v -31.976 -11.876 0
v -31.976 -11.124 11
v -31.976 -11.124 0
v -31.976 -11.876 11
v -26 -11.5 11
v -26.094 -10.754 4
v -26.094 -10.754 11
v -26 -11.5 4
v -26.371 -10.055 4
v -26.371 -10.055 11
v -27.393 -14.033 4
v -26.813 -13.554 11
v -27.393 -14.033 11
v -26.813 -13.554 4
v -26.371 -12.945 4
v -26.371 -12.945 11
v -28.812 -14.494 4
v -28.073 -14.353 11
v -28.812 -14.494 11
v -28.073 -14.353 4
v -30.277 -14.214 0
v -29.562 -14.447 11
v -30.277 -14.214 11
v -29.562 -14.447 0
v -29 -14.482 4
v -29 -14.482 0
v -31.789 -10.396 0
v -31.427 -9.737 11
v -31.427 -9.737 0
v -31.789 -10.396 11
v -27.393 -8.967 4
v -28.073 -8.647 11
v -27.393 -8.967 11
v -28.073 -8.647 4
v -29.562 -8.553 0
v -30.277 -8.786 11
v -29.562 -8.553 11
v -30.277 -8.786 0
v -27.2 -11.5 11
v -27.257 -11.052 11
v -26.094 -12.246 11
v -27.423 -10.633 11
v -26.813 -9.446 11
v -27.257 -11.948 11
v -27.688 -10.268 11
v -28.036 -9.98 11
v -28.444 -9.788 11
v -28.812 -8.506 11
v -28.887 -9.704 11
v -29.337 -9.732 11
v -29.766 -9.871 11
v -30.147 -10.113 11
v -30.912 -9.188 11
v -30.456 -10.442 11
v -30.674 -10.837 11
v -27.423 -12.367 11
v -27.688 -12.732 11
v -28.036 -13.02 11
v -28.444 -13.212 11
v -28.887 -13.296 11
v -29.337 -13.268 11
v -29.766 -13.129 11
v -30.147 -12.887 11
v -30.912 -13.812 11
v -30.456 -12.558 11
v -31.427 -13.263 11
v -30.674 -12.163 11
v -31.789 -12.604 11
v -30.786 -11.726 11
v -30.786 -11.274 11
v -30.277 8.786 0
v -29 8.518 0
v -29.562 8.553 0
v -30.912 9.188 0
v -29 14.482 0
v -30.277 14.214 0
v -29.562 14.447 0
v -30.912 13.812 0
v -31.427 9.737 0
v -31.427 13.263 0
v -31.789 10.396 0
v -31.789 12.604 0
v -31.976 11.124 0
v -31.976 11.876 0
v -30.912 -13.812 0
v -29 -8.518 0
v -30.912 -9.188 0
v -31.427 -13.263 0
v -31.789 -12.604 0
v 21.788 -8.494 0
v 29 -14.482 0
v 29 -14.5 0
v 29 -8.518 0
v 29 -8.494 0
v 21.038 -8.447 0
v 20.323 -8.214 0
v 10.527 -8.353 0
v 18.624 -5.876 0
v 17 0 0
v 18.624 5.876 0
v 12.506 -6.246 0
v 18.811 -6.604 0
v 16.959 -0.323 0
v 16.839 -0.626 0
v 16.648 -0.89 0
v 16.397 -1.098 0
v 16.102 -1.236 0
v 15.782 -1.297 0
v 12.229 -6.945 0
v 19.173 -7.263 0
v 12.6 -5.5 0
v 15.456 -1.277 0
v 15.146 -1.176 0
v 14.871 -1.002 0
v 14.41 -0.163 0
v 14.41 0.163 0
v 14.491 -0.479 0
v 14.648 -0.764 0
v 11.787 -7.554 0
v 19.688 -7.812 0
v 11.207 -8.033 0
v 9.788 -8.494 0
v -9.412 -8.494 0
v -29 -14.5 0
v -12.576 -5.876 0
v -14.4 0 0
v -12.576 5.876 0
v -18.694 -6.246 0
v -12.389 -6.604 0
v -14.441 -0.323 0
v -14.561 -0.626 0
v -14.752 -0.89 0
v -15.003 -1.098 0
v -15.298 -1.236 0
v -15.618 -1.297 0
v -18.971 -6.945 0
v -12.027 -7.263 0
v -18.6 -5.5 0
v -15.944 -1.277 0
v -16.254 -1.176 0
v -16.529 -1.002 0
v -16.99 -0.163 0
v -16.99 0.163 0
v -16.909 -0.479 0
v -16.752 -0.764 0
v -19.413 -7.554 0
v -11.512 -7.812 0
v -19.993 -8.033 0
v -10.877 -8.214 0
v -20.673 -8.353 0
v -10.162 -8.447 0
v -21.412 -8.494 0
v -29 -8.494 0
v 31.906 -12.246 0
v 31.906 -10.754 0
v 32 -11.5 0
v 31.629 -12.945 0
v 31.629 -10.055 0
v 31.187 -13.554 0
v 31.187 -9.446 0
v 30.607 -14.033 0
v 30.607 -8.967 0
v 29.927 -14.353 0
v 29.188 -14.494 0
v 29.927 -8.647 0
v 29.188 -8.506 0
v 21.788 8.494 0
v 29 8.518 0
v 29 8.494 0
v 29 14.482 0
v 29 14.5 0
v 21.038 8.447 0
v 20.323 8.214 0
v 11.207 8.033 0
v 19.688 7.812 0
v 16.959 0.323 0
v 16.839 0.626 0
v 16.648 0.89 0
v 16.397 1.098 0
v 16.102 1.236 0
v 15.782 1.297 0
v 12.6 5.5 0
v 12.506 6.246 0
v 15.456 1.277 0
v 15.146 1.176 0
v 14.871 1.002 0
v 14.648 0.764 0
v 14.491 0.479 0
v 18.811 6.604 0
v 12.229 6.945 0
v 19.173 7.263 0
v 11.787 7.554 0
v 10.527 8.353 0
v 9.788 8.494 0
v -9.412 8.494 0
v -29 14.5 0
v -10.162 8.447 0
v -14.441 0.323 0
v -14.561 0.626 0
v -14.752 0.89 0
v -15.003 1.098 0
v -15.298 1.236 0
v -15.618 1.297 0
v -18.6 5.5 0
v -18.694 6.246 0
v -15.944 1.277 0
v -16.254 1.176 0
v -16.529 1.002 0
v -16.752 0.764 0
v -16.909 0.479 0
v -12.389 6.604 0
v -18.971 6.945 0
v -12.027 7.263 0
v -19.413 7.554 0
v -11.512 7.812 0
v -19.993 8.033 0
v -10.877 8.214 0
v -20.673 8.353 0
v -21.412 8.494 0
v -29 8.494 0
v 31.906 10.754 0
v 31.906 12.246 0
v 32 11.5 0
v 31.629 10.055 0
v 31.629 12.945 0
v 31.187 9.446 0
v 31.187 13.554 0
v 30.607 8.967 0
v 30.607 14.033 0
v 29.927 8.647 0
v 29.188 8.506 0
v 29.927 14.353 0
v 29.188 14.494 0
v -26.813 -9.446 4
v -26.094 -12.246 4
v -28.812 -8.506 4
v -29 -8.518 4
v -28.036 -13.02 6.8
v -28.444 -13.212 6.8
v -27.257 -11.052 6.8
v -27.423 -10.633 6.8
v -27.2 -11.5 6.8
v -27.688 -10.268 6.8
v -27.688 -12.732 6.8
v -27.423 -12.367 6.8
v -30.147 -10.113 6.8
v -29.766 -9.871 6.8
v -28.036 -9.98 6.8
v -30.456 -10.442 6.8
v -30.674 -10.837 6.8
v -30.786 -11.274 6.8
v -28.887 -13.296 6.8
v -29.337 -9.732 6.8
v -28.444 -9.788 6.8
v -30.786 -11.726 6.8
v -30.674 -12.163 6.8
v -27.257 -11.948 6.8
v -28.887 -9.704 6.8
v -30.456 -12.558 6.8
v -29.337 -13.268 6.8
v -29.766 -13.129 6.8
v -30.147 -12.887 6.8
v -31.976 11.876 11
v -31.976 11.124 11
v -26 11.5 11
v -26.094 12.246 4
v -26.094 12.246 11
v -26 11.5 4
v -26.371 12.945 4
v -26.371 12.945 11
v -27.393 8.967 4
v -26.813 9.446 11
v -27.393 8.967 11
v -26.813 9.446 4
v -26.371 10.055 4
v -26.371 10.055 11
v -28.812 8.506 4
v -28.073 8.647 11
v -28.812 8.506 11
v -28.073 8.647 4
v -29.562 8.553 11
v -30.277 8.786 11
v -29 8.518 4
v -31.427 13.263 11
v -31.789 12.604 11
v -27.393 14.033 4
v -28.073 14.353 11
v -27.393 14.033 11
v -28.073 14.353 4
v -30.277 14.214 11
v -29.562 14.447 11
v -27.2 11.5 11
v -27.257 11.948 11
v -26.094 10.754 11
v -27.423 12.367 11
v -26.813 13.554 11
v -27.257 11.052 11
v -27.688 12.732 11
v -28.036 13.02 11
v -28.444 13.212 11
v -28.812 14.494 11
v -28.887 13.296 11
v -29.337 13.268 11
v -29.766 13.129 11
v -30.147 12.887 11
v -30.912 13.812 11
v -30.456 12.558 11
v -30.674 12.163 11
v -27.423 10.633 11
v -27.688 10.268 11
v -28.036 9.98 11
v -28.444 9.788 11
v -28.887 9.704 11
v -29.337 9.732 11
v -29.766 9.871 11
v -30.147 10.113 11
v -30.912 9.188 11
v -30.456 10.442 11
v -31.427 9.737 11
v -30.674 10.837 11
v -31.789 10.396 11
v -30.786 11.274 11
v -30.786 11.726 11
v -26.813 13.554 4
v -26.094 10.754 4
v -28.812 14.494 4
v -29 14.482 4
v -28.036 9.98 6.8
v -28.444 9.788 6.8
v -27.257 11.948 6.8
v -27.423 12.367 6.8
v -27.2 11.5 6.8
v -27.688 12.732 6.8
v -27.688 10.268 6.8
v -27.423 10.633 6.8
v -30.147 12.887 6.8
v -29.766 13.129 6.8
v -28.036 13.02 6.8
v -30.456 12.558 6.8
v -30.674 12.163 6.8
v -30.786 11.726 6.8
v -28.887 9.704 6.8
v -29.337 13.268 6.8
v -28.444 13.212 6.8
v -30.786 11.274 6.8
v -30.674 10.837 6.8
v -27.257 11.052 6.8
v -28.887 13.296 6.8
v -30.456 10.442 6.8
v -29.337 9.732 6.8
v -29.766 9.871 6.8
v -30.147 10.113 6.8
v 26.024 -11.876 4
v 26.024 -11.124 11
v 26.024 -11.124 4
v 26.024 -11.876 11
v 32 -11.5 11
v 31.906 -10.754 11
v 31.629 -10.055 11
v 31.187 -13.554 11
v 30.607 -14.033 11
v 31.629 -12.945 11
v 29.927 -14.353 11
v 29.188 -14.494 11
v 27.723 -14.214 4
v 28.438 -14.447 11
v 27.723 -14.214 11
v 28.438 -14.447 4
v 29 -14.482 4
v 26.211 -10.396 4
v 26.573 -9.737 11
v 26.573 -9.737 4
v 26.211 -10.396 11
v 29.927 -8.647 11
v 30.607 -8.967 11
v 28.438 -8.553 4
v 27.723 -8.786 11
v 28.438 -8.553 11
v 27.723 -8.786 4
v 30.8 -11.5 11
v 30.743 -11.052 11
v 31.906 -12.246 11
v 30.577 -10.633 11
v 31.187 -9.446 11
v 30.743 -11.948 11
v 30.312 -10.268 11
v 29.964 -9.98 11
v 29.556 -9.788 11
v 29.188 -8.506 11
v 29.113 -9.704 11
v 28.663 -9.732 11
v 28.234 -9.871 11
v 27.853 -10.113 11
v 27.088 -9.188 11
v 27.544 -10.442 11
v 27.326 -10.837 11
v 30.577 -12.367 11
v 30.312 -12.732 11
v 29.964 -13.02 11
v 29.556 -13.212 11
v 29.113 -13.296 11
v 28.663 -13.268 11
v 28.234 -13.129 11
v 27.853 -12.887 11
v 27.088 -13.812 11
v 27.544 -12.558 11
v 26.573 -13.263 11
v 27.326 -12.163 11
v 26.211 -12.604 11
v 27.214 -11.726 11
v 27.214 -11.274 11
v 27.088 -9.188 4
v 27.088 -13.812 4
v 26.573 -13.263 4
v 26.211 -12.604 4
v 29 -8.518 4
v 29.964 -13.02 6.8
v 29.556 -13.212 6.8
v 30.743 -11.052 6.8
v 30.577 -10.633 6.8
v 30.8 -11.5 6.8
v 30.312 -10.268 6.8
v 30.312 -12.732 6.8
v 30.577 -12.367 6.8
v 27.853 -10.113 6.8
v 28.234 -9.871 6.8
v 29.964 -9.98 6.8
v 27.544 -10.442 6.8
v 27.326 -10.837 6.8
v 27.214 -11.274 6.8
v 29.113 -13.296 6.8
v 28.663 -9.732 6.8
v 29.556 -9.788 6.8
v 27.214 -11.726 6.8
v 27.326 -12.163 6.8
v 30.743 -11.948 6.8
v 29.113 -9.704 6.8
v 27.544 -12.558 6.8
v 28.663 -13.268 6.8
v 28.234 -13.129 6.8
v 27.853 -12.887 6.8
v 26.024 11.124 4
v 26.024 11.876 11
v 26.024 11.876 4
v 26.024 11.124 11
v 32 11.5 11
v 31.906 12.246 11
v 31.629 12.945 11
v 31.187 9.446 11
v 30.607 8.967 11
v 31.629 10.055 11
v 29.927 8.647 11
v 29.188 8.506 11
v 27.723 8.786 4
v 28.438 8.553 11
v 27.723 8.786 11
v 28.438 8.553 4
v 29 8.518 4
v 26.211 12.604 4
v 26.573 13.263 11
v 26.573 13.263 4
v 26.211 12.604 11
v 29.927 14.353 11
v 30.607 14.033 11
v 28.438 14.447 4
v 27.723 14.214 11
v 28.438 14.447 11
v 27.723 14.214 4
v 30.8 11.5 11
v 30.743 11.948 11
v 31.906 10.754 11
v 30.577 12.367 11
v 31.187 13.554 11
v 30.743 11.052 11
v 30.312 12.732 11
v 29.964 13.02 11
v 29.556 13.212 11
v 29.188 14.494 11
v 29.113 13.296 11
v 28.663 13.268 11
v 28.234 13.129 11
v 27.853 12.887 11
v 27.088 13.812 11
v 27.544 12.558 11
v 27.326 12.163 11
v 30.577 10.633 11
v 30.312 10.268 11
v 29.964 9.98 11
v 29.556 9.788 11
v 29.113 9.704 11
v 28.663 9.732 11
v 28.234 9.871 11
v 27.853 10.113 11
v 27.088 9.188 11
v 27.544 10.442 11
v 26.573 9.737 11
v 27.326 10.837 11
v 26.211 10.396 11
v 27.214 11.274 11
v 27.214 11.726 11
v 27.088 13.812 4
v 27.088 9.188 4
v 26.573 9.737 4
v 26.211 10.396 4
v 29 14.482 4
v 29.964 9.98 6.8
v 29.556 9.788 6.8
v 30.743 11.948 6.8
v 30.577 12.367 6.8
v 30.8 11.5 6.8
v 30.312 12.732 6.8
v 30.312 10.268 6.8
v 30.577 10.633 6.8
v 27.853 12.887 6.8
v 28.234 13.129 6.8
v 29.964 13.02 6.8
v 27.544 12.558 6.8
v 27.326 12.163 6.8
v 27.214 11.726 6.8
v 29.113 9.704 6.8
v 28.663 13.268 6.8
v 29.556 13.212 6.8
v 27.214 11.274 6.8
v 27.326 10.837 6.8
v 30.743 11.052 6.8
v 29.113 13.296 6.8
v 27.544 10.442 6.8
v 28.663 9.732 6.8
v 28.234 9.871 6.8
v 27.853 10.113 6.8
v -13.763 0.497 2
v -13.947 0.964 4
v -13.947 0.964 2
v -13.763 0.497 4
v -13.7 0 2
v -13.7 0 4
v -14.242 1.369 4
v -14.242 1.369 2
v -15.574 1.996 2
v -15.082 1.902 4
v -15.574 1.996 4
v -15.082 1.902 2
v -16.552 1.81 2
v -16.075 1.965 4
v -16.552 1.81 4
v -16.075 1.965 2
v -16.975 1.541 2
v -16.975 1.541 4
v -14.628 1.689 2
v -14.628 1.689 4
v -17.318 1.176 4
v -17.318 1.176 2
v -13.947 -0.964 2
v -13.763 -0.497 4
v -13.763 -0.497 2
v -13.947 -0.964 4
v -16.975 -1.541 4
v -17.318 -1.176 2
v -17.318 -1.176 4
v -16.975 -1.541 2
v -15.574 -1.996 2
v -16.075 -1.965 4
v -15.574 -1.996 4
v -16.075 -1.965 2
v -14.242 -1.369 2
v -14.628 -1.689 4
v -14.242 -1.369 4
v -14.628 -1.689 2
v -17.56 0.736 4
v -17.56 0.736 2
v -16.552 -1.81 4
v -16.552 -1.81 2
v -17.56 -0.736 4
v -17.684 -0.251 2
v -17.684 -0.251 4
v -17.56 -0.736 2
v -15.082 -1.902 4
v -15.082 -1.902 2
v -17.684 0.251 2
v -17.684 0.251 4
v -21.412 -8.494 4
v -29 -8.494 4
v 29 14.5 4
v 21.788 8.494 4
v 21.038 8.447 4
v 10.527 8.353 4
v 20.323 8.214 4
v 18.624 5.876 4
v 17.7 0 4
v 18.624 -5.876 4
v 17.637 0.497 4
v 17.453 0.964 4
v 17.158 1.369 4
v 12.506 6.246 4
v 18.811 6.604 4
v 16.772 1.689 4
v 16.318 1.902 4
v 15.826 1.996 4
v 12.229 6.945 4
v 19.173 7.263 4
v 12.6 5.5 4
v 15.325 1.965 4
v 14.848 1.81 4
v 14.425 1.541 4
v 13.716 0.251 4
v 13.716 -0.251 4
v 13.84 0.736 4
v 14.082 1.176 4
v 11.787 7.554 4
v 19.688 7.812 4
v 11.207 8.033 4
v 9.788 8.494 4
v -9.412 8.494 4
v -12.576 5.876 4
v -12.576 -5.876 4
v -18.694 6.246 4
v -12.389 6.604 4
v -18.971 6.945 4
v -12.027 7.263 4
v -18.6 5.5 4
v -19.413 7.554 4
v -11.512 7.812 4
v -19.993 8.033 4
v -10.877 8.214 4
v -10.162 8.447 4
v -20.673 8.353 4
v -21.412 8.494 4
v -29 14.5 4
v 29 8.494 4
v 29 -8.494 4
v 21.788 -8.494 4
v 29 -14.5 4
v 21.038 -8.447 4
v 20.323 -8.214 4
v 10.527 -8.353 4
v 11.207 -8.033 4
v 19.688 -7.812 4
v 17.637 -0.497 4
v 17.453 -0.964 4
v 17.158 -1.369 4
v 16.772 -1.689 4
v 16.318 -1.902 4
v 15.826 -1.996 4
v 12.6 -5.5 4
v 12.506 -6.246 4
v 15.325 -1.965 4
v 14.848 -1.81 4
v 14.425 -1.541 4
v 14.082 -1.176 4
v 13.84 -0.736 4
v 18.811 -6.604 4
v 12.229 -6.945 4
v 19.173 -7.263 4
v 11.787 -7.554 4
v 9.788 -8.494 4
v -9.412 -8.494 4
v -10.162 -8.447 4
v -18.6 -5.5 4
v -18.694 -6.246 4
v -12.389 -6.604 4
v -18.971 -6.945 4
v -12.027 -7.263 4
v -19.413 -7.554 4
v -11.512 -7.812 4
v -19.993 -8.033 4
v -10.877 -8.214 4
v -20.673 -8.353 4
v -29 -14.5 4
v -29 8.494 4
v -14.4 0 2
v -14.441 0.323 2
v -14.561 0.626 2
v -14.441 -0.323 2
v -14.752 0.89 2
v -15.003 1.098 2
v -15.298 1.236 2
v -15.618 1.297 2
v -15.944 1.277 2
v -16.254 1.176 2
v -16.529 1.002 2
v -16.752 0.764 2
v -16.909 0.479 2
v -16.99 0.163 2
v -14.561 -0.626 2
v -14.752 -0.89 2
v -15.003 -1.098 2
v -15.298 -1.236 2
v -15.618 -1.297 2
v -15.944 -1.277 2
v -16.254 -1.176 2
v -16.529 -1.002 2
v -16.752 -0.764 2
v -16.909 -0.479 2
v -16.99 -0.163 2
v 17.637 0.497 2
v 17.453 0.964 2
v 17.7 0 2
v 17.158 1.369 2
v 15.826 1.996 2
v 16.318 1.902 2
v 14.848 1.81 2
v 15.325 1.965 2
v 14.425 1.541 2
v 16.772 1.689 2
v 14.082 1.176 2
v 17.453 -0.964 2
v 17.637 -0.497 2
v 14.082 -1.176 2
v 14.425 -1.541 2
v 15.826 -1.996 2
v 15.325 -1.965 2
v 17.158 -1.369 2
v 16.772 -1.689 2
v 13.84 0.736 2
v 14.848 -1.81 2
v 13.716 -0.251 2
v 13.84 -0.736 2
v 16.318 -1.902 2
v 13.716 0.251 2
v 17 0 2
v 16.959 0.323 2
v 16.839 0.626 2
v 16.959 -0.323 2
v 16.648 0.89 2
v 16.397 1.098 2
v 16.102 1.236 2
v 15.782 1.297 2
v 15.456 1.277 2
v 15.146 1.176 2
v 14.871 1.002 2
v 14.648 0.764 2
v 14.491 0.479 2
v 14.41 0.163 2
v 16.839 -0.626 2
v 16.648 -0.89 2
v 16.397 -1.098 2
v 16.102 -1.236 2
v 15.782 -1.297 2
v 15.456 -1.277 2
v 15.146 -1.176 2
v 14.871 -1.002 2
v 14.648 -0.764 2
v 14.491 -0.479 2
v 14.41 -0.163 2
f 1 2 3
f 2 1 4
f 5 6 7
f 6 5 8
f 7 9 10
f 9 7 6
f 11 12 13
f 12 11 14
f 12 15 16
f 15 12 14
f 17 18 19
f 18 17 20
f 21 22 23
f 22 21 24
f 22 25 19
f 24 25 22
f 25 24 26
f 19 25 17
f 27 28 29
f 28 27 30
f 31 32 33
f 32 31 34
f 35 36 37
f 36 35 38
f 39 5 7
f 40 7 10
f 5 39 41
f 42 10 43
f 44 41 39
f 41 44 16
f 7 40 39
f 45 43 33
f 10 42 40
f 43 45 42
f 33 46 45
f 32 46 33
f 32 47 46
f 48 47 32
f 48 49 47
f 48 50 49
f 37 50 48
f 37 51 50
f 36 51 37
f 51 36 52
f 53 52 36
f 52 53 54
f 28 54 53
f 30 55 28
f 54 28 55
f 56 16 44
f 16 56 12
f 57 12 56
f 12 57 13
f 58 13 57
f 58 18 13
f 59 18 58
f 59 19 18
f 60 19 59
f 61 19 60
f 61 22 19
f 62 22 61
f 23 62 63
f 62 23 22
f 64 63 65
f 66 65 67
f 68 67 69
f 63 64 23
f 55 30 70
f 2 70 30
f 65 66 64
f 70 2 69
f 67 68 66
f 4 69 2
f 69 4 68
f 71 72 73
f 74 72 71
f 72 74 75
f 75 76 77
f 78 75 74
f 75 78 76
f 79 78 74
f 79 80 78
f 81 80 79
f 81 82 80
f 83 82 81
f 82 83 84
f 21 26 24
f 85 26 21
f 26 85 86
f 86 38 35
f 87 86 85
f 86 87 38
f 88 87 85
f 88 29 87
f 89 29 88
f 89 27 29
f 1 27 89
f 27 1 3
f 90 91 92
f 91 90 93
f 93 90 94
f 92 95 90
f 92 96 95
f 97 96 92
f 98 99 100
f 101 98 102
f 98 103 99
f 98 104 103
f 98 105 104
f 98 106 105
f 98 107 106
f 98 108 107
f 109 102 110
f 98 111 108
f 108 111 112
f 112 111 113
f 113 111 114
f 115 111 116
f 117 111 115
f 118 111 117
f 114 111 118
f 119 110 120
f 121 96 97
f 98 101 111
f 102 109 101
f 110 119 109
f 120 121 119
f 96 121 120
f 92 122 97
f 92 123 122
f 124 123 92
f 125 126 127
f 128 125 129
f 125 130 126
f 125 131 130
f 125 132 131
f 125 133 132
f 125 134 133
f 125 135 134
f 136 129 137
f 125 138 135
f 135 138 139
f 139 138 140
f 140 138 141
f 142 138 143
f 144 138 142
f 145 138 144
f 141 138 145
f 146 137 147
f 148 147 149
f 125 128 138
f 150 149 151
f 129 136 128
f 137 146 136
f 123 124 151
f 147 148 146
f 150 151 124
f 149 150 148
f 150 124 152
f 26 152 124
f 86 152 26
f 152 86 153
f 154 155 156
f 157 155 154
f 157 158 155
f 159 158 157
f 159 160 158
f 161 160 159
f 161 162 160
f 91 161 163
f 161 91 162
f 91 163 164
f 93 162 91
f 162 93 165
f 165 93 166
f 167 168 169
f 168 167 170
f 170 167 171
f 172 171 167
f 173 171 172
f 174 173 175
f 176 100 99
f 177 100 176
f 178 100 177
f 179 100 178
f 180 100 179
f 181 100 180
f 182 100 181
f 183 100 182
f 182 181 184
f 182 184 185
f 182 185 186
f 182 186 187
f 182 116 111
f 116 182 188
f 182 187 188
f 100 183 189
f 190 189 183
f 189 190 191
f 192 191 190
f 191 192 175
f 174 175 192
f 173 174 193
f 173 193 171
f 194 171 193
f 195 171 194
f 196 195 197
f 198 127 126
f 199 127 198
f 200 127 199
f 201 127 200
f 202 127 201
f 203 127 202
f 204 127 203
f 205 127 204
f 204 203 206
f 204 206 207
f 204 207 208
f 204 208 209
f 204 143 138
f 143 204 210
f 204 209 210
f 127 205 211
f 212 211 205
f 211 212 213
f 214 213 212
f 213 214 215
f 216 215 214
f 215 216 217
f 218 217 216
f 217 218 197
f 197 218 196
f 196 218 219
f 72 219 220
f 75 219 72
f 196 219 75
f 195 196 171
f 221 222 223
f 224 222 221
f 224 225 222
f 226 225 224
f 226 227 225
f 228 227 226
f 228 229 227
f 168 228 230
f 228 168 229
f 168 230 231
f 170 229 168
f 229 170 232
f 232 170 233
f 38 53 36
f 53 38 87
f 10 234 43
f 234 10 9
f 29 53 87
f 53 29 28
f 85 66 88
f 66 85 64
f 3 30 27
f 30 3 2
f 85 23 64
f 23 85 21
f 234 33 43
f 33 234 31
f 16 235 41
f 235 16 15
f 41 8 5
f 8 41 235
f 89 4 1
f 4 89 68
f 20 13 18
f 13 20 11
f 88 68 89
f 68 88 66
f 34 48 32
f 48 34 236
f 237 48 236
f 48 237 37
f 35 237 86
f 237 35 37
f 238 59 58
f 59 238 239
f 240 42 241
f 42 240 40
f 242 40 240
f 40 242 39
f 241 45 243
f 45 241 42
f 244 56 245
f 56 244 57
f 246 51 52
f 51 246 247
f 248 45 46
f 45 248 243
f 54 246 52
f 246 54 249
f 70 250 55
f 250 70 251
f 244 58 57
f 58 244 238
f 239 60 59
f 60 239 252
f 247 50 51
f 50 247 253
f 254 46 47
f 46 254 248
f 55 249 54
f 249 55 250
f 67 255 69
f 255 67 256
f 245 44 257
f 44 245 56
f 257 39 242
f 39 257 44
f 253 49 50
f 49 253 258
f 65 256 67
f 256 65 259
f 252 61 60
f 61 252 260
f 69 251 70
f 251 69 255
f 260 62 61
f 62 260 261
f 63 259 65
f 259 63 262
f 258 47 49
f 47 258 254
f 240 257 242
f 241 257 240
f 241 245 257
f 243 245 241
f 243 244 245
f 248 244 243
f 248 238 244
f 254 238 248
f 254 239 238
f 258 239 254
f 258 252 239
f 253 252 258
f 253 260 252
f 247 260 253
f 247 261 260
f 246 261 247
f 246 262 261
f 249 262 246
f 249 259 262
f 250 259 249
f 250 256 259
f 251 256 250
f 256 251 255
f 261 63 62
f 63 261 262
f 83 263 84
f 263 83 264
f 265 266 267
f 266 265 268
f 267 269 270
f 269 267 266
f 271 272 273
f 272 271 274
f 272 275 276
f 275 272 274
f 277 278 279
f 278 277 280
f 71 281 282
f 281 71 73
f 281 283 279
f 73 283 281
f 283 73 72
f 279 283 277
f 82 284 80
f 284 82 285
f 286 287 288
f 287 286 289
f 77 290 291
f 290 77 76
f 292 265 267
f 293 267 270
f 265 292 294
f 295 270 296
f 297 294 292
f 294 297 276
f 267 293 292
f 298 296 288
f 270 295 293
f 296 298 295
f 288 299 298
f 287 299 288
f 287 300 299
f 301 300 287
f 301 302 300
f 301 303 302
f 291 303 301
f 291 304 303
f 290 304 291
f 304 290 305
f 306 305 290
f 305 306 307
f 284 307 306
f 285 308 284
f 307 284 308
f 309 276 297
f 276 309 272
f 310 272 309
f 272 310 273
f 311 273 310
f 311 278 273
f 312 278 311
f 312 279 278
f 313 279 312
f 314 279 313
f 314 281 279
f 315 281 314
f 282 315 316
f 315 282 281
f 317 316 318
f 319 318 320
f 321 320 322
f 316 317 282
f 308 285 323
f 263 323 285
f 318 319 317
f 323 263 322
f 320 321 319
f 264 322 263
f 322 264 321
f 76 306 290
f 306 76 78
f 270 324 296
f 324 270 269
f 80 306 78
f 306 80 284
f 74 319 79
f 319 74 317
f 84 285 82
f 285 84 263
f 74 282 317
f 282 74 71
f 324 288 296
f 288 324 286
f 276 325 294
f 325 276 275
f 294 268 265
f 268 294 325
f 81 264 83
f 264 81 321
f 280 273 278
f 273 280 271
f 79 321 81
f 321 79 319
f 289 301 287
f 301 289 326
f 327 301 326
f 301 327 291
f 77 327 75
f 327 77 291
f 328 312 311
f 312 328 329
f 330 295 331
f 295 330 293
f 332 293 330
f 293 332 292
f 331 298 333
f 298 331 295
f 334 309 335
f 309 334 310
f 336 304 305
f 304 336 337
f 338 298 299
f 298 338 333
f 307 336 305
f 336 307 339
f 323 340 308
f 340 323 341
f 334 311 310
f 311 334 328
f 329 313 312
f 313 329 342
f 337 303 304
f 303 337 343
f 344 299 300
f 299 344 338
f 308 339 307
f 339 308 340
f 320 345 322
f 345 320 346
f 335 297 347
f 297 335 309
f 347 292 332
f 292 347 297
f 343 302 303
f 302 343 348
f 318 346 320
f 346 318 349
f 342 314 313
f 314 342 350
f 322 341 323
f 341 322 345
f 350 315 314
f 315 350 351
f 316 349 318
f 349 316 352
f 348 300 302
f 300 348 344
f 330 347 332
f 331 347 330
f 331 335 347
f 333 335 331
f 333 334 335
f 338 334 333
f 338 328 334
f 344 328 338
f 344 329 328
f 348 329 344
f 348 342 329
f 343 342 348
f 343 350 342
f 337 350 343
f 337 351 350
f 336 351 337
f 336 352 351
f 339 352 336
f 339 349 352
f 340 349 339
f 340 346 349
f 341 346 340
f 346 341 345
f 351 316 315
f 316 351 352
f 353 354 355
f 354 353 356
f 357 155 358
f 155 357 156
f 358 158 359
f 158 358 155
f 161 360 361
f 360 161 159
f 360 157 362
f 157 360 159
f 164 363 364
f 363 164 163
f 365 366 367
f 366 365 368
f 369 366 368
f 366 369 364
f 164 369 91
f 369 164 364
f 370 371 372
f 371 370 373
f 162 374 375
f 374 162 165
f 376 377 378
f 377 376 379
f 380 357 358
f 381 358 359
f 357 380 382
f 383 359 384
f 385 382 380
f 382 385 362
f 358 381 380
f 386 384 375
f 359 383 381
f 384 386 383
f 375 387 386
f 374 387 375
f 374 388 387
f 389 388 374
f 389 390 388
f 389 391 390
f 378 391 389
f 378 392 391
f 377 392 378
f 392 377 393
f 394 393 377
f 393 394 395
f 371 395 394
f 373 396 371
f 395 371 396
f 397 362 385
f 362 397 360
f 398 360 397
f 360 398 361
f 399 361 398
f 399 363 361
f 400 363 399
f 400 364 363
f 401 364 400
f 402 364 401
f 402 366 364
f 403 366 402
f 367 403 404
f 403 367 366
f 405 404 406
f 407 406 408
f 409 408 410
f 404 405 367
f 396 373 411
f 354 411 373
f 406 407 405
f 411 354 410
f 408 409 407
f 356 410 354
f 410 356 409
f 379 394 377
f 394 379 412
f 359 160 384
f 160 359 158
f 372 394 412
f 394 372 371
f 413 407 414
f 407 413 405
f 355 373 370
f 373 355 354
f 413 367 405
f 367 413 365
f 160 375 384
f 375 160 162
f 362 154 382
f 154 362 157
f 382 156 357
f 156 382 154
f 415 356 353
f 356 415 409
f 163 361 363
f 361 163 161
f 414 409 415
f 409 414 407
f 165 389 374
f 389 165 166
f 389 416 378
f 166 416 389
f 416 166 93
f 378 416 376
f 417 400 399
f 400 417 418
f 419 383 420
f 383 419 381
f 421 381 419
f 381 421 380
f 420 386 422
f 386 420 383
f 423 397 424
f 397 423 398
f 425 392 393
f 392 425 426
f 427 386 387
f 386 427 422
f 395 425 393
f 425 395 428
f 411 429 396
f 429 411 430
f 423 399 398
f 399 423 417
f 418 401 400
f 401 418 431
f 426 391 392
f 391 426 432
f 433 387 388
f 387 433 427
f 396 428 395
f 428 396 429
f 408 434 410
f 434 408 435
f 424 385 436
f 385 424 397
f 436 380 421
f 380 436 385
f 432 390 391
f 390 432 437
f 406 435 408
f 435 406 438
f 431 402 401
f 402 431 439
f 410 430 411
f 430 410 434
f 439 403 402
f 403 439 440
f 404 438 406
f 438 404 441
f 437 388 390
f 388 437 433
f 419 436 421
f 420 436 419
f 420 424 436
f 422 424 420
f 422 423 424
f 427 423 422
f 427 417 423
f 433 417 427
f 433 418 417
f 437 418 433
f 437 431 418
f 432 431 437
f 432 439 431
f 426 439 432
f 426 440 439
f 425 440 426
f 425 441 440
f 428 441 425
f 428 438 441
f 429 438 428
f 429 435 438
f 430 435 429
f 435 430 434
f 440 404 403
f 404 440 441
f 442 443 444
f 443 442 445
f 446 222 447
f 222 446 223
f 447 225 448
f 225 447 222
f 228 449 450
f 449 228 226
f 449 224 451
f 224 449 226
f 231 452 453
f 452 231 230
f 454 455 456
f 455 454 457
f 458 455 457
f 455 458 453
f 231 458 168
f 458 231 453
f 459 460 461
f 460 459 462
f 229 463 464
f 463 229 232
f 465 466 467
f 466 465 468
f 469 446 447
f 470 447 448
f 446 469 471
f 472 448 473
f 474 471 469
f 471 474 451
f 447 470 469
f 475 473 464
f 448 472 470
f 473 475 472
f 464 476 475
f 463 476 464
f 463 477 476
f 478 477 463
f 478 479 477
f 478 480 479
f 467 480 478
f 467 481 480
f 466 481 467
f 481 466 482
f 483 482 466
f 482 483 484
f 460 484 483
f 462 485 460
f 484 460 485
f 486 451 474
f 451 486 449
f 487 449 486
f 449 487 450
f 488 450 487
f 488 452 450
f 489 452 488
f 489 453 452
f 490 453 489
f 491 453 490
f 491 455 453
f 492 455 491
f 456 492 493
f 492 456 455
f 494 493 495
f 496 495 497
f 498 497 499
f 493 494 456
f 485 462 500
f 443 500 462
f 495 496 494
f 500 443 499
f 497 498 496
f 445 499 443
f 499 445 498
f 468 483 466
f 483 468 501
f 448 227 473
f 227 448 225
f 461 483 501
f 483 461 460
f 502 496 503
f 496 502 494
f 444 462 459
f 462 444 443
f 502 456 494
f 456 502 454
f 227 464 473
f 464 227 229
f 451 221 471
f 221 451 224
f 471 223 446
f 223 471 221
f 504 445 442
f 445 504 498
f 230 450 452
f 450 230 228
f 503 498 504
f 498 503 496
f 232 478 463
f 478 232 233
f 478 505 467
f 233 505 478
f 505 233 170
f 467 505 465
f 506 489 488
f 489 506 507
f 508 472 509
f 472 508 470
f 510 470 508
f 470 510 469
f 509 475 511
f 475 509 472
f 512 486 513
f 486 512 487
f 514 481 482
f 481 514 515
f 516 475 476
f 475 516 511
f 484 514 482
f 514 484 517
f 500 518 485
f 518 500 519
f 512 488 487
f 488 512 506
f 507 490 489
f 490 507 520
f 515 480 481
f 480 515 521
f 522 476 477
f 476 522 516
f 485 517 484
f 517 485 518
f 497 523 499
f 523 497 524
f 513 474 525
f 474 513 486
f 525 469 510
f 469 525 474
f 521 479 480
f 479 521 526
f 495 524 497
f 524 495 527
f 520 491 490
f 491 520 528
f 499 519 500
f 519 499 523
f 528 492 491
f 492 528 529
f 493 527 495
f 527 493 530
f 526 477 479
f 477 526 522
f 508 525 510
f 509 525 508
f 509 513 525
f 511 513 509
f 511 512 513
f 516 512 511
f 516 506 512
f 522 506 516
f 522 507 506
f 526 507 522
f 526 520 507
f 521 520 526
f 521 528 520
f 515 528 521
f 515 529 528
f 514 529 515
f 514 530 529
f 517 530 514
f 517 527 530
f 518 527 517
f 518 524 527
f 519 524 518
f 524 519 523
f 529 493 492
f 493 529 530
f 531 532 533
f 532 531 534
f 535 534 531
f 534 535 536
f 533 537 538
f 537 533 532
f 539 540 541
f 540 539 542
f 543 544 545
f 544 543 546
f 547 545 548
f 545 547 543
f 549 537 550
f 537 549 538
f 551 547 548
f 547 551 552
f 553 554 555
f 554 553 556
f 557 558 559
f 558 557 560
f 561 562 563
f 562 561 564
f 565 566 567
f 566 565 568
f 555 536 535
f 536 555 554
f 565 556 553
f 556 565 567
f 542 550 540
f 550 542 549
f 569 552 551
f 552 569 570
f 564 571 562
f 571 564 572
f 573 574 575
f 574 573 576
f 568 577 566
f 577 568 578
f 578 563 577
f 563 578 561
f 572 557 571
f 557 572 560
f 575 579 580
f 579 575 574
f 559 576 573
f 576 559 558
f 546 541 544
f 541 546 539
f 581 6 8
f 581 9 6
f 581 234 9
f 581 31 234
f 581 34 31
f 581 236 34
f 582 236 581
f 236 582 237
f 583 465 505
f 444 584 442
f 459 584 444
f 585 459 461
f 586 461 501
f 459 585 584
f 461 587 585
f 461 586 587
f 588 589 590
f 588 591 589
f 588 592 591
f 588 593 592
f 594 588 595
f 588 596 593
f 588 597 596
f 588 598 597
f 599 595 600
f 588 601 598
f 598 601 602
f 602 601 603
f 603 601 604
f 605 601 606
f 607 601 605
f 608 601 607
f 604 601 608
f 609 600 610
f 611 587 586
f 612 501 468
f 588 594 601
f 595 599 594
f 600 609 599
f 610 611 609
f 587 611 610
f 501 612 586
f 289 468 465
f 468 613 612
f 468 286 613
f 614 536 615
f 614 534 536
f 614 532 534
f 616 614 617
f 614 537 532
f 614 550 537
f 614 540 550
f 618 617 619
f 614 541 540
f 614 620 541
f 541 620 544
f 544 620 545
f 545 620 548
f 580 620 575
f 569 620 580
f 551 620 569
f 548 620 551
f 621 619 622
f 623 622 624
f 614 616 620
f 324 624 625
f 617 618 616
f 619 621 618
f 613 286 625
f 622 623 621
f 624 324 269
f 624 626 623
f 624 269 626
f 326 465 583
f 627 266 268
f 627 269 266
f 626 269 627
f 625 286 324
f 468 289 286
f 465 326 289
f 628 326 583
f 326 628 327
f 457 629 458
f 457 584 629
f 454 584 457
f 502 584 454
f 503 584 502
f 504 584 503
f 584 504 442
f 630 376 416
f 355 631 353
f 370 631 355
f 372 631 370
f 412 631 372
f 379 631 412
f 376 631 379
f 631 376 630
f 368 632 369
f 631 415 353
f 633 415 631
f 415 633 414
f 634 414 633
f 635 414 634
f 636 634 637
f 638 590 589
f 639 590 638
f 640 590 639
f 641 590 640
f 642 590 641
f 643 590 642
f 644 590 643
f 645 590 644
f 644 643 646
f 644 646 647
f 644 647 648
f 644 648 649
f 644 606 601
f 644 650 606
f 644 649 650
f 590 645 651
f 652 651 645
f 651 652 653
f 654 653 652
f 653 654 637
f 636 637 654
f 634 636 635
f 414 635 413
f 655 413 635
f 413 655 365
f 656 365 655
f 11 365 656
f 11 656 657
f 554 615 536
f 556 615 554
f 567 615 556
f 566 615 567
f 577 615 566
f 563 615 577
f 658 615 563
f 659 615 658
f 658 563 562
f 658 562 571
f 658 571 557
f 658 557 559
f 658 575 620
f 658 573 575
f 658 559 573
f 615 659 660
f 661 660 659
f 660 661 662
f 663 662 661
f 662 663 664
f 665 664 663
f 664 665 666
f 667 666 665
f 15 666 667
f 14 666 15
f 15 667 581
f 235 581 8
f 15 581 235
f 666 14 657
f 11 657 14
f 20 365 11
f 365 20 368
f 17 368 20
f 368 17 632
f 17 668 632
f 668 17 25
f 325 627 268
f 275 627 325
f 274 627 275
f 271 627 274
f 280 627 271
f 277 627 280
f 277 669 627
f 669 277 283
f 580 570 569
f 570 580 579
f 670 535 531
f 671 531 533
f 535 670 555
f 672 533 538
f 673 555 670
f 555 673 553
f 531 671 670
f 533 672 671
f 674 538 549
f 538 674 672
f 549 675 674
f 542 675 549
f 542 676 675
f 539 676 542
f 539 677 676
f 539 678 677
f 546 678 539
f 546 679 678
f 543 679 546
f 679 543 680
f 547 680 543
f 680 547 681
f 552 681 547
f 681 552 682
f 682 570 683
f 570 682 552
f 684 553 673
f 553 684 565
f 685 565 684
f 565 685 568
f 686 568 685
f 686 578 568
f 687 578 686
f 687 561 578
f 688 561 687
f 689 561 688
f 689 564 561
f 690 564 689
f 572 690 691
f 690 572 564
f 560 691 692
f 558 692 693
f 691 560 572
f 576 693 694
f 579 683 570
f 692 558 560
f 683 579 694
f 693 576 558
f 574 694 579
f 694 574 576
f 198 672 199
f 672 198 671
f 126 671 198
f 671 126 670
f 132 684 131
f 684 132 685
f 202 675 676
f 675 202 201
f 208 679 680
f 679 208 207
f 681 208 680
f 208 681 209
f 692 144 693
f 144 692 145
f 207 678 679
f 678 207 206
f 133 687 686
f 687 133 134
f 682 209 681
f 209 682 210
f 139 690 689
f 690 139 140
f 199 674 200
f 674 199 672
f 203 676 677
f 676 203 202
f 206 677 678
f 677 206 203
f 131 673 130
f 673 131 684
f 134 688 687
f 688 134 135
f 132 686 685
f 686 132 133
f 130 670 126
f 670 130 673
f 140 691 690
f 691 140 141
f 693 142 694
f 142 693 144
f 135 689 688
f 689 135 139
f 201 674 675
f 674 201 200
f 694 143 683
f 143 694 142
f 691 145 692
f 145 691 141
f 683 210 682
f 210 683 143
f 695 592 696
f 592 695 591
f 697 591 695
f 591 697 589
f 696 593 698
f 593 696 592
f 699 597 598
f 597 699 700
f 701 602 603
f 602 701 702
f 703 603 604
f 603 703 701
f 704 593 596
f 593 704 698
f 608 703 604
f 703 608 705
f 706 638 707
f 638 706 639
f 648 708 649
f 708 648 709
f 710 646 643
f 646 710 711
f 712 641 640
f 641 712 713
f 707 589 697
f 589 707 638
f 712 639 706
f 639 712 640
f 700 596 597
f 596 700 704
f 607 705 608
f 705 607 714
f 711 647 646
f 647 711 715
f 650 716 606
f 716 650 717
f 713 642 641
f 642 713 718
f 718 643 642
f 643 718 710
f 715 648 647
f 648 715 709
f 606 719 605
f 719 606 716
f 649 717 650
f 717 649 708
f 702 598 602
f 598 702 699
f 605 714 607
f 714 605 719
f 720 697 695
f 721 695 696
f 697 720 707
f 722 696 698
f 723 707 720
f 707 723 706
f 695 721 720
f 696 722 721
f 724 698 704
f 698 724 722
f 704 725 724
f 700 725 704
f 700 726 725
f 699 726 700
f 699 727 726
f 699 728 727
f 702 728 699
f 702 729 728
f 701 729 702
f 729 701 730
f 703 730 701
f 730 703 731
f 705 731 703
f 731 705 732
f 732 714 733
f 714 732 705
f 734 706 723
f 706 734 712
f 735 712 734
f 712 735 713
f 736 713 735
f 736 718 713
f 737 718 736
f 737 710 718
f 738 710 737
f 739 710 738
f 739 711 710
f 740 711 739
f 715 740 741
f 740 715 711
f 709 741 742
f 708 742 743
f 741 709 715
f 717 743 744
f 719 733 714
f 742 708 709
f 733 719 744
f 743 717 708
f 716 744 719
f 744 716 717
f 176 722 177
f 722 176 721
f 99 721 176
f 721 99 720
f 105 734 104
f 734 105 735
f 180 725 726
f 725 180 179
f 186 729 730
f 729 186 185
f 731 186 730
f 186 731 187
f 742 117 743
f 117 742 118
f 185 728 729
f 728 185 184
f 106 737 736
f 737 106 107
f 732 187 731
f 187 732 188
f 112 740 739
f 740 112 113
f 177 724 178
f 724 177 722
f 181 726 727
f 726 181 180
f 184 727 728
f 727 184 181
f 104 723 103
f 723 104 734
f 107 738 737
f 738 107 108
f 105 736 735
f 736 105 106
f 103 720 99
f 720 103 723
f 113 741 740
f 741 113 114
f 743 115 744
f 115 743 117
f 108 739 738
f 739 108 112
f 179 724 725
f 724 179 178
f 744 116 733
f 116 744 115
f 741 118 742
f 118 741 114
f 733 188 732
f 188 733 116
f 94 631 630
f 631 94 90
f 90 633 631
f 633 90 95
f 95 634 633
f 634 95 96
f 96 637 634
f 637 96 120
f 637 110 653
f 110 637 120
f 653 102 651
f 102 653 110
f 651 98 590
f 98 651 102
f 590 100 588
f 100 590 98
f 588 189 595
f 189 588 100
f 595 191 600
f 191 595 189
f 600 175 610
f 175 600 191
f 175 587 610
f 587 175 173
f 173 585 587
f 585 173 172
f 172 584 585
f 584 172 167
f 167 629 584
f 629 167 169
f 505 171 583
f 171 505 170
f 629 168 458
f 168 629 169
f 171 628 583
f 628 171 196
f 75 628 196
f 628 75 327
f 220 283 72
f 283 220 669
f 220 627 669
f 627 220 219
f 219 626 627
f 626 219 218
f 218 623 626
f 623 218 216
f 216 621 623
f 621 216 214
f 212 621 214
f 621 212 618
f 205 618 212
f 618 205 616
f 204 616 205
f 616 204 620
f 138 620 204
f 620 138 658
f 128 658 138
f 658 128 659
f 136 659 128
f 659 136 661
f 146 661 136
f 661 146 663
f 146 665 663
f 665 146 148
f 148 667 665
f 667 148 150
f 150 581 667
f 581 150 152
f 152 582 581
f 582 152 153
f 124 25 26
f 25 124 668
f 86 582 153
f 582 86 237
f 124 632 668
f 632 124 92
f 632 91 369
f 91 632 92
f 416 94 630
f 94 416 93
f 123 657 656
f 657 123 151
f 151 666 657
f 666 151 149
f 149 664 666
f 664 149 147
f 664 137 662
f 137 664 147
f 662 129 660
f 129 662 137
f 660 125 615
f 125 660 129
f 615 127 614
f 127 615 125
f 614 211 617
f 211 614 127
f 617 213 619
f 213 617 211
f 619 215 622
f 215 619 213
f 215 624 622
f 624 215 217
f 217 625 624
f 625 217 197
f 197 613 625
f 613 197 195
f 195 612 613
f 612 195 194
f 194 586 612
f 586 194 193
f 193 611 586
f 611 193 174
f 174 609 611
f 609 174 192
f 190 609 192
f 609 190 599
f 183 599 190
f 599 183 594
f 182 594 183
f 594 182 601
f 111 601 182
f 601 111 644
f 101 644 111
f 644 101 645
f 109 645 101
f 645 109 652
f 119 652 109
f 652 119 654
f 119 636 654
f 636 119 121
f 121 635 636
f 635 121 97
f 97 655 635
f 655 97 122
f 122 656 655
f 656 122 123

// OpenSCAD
module m2_5_ThreadedInsert() {
    cylinder(h=4.2, d=3.6, $fn=25);
}

module zero4uMount_Column() {
    let(usbZ=7, frameZ=4, colZ=usbZ+frameZ) {
        difference() {
            cylinder(h=colZ, d=6, $fn=25);
            
            translate([0,0,colZ-4.2])
                m2_5_ThreadedInsert();
        }
    }
}

module zero4uMount_HolePattern(center=false) {
    translate([center?58/-2:0,center?23/-2:0]) {
        for (x = [0:58:58]) {
            for (y = [0:23:23]) {
                translate([x,y,0])
                    children();
            }
        }
    }
}

module rect_rounded(size, radius, center=false) {
    let(rectW=size[0], rectH=size[1]) {
        translate([center ? size[0]/-2 : 0, center ? size[1]/-2 : 0]) 
            hull() {
                translate([radius, radius])
                    circle(r=radius, $fn=25);

                translate([rectW-radius, radius])
                    circle(r=radius, $fn=25);

                translate([radius, rectH-radius])
                    circle(r=radius, $fn=25);

                translate([rectW-radius, rectH-radius])
                    circle(r=radius, $fn=25);
            }
    }
}

module m2_5_mountingHole() {
    union() {
        translate([0,0,2])
            cylinder(h=2, d=4, $fn=25);

        cylinder(h=4, d=2.6, $fn=25); 
    }
}

module zero4uMount_voronDinRailHolePattern(center=false) {
    let(distance=31.4) {
        translate([center ? distance/-2 : 0, 0])
        union() {
             m2_5_mountingHole();
            
            translate([distance, 0, 0])
                m2_5_mountingHole();
        }
    }
}

module zero4uMount_base() {
    let(colR=3, colD=colR*2, baseX=58, baseY=23+colR*2, dinX=31.2) {
       linear_extrude(4) difference() {
            square([baseX,baseY], center=true);
            
            rect_rounded([dinX-colD,baseY-colD*2],3, center=true);
            
            translate([baseX/2,0,0])
                rect_rounded([(baseX-dinX)-colD,baseY-colD*2],3, center=true);

            translate([baseX/-2,0,0])
                rect_rounded([(baseX-dinX)-colD,baseY-colD*2],3, center=true);
        }
    }
}

module zero4uMount() {
    union() {
        zero4uMount_HolePattern(center=true)
            zero4uMount_Column();
        
        difference() {
            zero4uMount_base();
            
            zero4uMount_voronDinRailHolePattern(center=true);
        }
    }
}

zero4uMount();
